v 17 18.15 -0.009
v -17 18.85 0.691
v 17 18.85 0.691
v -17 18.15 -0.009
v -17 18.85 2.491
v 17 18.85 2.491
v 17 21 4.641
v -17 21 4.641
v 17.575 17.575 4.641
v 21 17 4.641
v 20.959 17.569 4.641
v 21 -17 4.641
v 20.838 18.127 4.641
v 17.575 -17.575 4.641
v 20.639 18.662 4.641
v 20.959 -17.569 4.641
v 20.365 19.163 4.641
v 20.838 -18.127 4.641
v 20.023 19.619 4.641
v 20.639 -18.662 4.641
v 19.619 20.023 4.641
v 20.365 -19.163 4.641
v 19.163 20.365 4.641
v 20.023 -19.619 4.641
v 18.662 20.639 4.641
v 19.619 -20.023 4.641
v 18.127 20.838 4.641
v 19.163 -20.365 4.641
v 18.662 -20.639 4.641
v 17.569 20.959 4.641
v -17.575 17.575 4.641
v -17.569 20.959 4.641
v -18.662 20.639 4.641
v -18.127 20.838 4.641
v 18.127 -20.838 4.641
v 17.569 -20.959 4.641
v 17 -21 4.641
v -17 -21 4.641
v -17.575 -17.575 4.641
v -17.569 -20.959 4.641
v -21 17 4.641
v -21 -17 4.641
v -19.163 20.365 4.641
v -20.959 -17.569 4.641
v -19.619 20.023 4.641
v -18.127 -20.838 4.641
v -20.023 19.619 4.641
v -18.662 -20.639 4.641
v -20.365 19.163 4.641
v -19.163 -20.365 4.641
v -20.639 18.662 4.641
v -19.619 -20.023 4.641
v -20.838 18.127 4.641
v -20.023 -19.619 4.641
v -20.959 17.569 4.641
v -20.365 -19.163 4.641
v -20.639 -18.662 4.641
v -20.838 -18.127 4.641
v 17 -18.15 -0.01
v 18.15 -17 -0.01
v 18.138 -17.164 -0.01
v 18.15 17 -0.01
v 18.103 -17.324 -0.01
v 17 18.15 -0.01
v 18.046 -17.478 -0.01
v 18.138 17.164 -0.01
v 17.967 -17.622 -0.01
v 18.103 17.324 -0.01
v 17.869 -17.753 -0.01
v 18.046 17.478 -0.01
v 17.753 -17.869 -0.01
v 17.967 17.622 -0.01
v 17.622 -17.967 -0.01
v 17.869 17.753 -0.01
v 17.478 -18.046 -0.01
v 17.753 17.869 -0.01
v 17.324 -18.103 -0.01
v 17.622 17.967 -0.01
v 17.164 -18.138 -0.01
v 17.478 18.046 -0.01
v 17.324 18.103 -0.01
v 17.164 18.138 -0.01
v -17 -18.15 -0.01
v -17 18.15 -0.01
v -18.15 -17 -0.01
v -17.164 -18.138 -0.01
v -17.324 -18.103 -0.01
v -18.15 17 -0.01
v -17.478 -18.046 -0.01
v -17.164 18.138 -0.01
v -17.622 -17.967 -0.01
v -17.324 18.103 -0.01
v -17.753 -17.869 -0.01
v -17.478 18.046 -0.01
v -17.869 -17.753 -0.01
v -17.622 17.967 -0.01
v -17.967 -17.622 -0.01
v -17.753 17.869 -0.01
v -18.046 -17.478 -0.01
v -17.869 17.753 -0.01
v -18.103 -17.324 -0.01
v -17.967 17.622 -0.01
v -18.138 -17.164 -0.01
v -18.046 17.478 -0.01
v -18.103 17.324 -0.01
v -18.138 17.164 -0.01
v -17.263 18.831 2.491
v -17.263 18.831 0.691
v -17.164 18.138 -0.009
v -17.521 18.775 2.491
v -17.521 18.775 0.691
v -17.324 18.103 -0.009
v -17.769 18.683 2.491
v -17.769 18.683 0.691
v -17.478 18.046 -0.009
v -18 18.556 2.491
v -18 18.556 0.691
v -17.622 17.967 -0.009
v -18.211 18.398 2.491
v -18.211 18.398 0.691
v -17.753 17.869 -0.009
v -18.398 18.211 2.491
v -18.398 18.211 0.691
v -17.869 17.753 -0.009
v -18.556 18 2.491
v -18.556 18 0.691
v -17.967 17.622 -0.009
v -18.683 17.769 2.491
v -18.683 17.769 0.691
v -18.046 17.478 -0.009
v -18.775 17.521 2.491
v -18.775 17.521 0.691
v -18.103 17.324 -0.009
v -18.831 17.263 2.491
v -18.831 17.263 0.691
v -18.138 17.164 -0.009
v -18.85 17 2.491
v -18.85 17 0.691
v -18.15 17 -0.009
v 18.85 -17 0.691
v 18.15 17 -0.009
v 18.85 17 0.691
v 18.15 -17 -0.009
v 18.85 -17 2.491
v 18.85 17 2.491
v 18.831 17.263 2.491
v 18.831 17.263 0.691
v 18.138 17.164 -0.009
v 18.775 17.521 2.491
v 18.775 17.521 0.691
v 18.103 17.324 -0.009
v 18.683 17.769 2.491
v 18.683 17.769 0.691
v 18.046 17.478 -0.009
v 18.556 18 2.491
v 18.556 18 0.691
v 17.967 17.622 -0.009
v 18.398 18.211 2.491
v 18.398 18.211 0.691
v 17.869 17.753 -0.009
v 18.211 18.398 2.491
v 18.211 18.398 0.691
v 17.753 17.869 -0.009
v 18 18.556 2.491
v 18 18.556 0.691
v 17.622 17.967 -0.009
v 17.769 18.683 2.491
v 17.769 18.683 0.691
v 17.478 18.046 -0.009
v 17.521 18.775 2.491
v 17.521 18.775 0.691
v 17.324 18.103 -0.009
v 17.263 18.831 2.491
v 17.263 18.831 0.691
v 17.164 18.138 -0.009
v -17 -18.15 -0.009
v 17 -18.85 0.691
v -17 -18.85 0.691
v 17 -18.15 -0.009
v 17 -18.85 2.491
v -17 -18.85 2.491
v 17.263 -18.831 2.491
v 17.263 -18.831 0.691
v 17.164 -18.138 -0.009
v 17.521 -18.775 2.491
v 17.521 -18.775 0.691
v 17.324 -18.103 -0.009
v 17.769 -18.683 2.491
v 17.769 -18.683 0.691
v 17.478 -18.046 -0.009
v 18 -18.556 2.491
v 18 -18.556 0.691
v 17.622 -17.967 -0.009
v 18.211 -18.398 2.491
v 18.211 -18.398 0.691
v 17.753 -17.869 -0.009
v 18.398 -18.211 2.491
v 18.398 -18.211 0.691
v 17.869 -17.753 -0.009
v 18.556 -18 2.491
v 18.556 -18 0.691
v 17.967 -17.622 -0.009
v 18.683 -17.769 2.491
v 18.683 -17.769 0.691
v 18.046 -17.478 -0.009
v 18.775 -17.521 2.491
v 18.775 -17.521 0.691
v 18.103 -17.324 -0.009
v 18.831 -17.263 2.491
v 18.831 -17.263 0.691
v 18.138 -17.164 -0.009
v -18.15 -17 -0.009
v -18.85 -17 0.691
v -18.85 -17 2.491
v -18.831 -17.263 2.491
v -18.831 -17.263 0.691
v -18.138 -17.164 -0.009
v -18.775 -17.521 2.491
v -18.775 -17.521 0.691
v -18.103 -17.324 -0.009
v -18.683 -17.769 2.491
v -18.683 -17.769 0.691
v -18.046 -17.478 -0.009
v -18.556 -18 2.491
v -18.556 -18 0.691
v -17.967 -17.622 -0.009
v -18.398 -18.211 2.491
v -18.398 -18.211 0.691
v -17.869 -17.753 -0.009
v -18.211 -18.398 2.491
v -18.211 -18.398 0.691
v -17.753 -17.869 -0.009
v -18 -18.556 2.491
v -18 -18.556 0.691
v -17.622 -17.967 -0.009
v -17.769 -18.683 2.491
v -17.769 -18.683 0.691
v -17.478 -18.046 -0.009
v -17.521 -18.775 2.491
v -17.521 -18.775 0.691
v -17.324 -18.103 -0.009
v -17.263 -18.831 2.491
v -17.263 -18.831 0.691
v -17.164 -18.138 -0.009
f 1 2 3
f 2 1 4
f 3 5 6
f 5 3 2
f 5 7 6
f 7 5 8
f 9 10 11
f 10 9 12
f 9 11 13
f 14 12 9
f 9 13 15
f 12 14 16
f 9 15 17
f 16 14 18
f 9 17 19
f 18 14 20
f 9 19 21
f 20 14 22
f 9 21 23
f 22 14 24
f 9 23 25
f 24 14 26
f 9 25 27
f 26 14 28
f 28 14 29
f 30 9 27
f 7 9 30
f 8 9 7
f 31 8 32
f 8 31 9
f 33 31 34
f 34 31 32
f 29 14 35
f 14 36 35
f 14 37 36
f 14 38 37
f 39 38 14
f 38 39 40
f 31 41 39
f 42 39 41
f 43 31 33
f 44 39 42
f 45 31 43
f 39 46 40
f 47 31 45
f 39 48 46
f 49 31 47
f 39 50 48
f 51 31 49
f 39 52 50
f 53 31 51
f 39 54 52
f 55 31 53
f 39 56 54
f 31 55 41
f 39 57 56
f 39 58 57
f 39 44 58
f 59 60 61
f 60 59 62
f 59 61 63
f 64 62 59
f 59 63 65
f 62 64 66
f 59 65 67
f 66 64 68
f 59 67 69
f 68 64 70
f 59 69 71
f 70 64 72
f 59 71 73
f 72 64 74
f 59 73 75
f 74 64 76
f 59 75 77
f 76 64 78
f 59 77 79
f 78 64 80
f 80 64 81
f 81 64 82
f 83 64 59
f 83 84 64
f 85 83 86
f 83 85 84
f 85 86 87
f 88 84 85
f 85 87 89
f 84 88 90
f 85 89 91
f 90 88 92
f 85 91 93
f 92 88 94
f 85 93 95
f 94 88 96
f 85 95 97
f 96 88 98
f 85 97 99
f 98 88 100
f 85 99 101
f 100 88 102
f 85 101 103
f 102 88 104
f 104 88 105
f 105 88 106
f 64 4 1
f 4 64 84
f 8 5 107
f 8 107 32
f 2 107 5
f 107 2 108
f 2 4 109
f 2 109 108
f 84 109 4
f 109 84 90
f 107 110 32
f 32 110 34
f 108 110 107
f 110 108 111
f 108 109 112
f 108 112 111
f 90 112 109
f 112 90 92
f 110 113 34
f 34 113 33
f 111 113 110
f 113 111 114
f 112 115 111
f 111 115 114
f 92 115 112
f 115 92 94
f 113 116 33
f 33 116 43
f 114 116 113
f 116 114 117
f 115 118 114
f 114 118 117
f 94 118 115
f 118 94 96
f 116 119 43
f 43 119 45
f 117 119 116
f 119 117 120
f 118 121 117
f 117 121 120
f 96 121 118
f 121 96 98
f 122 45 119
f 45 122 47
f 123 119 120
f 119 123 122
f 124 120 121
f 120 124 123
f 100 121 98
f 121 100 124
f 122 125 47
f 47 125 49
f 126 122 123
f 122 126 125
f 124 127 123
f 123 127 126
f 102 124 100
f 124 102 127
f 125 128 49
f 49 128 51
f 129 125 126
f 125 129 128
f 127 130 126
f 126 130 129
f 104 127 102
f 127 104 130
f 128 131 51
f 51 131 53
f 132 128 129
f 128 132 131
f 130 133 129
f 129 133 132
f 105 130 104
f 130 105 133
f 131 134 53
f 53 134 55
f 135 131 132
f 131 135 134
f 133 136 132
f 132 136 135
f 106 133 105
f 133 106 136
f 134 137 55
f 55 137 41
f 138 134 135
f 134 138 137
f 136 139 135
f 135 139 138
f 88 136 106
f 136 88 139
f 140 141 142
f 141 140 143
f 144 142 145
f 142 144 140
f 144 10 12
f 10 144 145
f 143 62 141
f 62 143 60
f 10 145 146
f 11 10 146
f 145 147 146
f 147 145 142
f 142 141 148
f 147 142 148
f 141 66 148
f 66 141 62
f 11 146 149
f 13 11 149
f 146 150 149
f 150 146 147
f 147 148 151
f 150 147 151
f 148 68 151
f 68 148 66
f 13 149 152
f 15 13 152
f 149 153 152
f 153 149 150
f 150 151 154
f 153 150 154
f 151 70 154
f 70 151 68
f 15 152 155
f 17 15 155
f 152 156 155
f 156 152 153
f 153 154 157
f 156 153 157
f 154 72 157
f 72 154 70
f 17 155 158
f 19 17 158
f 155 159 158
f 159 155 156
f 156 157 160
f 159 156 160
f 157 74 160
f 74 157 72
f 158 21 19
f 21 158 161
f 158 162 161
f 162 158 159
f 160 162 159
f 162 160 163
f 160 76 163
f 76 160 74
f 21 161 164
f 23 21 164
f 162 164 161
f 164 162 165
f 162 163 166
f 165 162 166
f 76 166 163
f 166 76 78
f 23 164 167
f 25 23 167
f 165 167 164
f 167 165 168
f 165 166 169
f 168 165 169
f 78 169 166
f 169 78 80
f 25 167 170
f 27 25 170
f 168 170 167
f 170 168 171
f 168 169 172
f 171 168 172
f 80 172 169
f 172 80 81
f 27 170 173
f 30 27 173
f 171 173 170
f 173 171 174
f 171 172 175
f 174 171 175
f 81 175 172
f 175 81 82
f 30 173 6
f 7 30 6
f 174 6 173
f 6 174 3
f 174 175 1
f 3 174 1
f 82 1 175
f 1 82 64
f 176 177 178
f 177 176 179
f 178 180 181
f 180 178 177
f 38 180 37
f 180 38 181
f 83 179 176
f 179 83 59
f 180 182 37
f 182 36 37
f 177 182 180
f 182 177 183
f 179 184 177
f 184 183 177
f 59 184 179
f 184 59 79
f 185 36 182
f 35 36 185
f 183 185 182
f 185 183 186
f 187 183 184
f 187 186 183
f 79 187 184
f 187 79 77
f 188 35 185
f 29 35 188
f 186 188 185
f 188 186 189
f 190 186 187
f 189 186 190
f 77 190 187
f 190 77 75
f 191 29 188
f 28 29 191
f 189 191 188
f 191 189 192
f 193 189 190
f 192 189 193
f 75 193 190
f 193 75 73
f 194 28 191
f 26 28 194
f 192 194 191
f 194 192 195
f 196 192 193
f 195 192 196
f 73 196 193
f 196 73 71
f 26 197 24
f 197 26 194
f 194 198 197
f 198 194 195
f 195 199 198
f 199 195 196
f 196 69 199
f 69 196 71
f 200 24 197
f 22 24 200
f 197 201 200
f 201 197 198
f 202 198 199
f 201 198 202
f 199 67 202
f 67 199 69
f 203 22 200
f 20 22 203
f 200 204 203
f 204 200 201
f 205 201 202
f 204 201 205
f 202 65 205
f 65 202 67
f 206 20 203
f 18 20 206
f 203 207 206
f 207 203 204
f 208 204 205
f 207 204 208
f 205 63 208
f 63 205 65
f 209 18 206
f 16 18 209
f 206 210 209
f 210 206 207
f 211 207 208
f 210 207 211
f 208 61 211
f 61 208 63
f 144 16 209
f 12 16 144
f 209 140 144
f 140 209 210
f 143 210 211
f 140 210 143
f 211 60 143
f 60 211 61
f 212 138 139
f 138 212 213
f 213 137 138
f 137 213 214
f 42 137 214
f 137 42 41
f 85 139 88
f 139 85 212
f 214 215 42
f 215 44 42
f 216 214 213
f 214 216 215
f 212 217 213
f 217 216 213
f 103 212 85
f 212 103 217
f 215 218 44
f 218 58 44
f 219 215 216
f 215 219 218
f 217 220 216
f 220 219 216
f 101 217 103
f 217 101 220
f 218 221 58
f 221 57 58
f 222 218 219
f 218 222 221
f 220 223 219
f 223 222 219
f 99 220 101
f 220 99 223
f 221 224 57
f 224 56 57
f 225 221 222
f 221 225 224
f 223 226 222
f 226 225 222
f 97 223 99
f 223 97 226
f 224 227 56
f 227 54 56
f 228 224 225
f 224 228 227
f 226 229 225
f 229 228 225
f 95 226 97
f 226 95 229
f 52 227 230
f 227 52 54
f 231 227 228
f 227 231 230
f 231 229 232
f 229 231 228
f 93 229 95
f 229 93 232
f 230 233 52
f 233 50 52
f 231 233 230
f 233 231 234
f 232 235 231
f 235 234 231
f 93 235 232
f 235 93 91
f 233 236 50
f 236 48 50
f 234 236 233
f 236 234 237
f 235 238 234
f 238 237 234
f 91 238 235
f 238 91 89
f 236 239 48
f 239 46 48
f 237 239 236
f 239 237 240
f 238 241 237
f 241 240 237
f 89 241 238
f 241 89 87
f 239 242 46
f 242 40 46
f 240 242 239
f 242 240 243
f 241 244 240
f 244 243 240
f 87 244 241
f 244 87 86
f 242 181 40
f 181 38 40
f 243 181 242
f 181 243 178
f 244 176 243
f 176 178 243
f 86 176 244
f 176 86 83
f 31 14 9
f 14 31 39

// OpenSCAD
module gridfinity_base_tile_raw(distancex=0, distancey=0, fitx=0, fity=0) {
    $fa = 8;
    $fs = 0.25;

    function _rx(a) = [
        [1, 0, 0, 0],
        [0, cos(a), -sin(a), 0],
        [0, sin(a), cos(a), 0],
        [0, 0, 0, 1]
    ];

    function _ry(a) = [
        [cos(a), 0, sin(a), 0],
        [0, 1, 0, 0],
        [-sin(a), 0, cos(a), 0],
        [0, 0, 0, 1]
    ];

    function _rz(a) = [
        [cos(a), -sin(a), 0, 0],
        [sin(a), cos(a), 0, 0],
        [0, 0, 1, 0],
        [0, 0, 0, 1]
    ];

    module sweep_rounded_square_34() {
        path_points = [
            [-17, 17],
            [17, 17],
            [17, -17],
            [-17, -17],
            [-17, 17]
        ];

        path_vectors = [
            path_points[1] - path_points[0],
            path_points[2] - path_points[1],
            path_points[3] - path_points[2],
            path_points[4] - path_points[3]
        ];

        first_translation = [
            [1, 0, 0, path_points[0].y],
            [0, 1, 0, 0],
            [0, 0, 1, path_points[0].x],
            [0, 0, 0, 1]
        ];

        affine_translations = concat([first_translation], [
            for (
                i = 0, a = first_translation;
                i < len(path_vectors);
                a = a * [
                    [1, 0, 0, path_vectors[i].y],
                    [0, 1, 0, 0],
                    [0, 0, 1, path_vectors[i].x],
                    [0, 0, 0, 1]
                ],
                i = i + 1
            )
            a * [
                [1, 0, 0, path_vectors[i].y],
                [0, 1, 0, 0],
                [0, 0, 1, path_vectors[i].x],
                [0, 0, 0, 1]
            ]
        ]);

        base_rotation = _rz(90) * _ry(0) * _rx(90);

        walls = [
            for (i = [0 : 3])
            base_rotation * affine_translations[i]
            * (_rz(0) * _ry(atan2(path_vectors[i].y, path_vectors[i].x)) * _rx(0))
        ];

        union() {
            for (i = [0 : 3]) {
                multmatrix(walls[i])
                linear_extrude(34)
                children();

                multmatrix(walls[i] * (_rz(0) * _ry(0) * _rx(-90)))
                rotate_extrude(angle = 90, convexity = 4)
                children();
            }
        }
    }

    grid_size = [1, 1];

    grid_size_mm = [grid_size.x * 42, grid_size.y * 42, 4.631];
    size_mm = [
        max(grid_size_mm.x, distancex),
        max(grid_size_mm.y, distancey),
        4.631
    ];
    padding_mm = size_mm - grid_size_mm;
    fit_percent_positive = [(fitx + 1) / 2, (fity + 1) / 2];

    padding_start_point = -grid_size_mm / 2 - [
        padding_mm.x * (1 - fit_percent_positive.x),
        padding_mm.y * (1 - fit_percent_positive.y),
        -grid_size_mm.z / 2
    ];

    echo(str("Number of Grids per axes (X, Y)]: ", grid_size));
    echo(str("Final size (in mm): ", size_mm));

    if (padding_mm != [0, 0, 0]) {
        echo(str("Padding +X (in mm): ", padding_mm.x * fit_percent_positive.x));
        echo(str("Padding -X (in mm): ", padding_mm.x * (1 - fit_percent_positive.x)));
        echo(str("Padding +Y (in mm): ", padding_mm.y * fit_percent_positive.y));
        echo(str("Padding -Y (in mm): ", padding_mm.y * (1 - fit_percent_positive.y)));
    }

    translate(padding_start_point)
    for (x = [0 : grid_size.x - 1]) {
        for (y = [0 : grid_size.y - 1]) {
            translate([(x + 0.5) * 42, (y + 0.5) * 42, -0.01])
            union() {
                sweep_rounded_square_34() {
                    polygon([
                        [1.15, 0.001],
                        [1.85, 0.701],
                        [1.85, 2.501],
                        [4.00, 4.651],
                        [0, 4.651],
                        [0, 0],
                        [1.15, 0]
                    ]);
                }

                translate([0, 0, 4.651 / 2])
                cube([35.15, 35.15, 4.651], center = true);
            }
        }
    }
}

gridfinity_base_tile_raw();
